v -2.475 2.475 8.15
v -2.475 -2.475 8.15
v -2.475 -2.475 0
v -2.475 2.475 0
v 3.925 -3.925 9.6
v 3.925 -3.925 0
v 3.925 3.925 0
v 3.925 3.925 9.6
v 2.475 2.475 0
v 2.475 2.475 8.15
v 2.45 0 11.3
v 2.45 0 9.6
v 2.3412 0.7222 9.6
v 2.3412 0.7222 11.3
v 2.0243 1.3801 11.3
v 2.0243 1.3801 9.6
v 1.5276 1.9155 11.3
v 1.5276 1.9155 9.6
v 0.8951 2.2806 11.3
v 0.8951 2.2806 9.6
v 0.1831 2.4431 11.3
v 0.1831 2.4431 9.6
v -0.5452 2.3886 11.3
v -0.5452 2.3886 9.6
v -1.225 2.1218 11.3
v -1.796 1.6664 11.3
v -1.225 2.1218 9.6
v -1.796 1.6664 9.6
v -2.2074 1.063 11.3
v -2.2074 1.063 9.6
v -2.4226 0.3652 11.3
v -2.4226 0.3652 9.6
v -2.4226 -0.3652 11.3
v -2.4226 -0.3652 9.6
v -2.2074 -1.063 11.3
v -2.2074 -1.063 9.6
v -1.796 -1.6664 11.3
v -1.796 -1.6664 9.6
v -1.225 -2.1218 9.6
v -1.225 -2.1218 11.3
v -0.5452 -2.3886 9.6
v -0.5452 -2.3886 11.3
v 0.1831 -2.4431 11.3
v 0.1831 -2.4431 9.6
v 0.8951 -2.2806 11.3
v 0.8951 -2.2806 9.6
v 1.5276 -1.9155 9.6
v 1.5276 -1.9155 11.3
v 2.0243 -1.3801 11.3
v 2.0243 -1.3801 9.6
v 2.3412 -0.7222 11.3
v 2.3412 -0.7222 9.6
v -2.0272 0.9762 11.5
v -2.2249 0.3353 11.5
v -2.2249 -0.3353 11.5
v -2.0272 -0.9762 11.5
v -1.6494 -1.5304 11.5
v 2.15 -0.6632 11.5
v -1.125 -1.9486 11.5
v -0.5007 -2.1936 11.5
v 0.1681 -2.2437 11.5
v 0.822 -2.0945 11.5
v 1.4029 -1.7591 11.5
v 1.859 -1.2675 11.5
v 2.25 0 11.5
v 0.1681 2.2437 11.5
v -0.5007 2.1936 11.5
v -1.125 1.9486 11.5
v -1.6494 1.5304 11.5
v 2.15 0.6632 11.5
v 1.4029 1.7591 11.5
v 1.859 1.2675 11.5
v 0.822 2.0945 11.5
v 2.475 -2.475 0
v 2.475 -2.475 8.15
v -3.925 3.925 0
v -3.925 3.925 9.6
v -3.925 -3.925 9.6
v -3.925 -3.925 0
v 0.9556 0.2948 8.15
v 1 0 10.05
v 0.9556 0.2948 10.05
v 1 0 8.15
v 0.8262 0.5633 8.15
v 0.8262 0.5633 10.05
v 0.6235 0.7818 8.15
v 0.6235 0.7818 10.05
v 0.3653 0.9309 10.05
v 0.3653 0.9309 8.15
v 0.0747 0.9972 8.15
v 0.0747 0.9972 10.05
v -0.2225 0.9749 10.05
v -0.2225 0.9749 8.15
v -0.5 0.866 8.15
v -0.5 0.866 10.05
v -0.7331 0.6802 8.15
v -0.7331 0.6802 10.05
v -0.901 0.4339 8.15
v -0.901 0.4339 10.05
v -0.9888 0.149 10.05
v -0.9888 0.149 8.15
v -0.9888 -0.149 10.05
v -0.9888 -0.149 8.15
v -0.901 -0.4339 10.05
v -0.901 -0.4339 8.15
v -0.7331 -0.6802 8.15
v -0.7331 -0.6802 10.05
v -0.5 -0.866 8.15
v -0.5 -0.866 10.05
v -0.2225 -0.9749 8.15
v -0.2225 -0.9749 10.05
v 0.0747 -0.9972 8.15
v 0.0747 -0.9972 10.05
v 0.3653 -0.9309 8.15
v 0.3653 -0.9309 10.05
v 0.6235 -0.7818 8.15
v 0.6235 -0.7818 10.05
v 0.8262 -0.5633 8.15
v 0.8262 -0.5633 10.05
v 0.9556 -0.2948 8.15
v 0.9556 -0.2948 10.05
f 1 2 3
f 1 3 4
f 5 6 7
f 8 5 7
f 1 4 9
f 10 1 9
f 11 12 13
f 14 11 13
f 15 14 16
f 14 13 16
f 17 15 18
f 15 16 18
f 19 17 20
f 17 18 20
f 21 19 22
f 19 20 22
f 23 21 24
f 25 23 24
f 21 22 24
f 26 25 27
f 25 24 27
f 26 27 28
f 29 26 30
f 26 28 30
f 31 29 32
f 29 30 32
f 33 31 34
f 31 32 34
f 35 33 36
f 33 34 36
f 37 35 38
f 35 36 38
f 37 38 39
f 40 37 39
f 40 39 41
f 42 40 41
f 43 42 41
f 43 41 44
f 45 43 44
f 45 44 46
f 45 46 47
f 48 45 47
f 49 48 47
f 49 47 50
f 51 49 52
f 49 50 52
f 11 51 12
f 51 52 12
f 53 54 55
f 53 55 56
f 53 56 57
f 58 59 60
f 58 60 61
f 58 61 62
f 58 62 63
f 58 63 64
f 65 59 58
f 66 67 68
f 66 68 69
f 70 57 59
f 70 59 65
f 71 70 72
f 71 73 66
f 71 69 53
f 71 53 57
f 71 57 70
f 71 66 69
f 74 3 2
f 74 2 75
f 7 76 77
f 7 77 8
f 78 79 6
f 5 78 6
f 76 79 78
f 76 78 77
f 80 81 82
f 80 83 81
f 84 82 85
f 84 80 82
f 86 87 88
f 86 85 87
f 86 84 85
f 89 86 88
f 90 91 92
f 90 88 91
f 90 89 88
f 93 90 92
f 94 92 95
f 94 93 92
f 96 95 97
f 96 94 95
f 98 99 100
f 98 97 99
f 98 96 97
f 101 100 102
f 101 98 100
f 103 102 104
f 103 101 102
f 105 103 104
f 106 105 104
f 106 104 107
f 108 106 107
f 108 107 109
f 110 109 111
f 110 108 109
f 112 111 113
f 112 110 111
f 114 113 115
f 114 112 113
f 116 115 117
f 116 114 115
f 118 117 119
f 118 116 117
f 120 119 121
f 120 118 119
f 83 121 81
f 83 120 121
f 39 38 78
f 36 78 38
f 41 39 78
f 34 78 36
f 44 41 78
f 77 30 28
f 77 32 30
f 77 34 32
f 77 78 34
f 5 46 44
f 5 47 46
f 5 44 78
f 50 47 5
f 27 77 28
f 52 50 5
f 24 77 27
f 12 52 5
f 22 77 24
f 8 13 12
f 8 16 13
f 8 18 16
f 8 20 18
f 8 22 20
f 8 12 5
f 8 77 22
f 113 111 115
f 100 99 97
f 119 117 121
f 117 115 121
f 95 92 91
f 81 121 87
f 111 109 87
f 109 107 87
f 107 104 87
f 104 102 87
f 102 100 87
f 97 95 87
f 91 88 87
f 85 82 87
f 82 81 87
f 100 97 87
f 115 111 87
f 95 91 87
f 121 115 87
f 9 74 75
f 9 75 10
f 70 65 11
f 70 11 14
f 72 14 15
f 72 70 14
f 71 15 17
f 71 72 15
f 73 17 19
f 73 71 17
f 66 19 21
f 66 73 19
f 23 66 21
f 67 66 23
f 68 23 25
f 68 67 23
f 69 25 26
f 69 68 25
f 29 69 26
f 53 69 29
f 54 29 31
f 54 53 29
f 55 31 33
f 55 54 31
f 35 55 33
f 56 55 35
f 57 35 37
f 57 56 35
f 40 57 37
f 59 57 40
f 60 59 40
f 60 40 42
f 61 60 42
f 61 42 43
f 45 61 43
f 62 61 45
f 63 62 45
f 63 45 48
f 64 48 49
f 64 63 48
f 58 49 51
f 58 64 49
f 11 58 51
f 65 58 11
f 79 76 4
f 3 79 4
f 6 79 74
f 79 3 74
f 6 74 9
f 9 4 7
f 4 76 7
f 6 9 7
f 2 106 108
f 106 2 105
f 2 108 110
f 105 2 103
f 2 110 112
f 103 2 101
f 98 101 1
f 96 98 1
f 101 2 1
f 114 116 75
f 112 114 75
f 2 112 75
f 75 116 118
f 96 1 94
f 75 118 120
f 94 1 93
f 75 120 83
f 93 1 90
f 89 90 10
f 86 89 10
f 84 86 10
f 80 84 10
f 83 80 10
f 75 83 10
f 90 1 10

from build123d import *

# Parameters (mm, degrees)
F0_W     = 7.85
F0_H     = 7.85
F1_DEPTH = 9.6
F2_R     = 2.45
F3_DEPTH = 1.9
F4_T     = -1.45
F5_SIZE  = 0.2


with BuildPart() as f1:
    # F0 (on Top) → F1 (new body)
    with BuildSketch(Plane.XY):
        Rectangle(F0_W, F0_H)
    extrude(amount=F1_DEPTH)

    # F2 (on face) → F3 (join)
    with BuildSketch(Plane.XY.offset(9.6)):
        Circle(F2_R)
    extrude(amount=F3_DEPTH)

    # F4
    f4_openings = [f1.faces().sort_by_distance(p)[0] for p in [
        (0, 0, 0),
    ]]
    offset(amount=F4_T, openings=f4_openings, kind=Kind.INTERSECTION)

    # F5
    f5_edges = [f1.edges().sort_by_distance(p)[0] for p in [
        (-2.45, 0, 11.5),
    ]]
    chamfer(f5_edges, length=F5_SIZE)


solid = f1.part
